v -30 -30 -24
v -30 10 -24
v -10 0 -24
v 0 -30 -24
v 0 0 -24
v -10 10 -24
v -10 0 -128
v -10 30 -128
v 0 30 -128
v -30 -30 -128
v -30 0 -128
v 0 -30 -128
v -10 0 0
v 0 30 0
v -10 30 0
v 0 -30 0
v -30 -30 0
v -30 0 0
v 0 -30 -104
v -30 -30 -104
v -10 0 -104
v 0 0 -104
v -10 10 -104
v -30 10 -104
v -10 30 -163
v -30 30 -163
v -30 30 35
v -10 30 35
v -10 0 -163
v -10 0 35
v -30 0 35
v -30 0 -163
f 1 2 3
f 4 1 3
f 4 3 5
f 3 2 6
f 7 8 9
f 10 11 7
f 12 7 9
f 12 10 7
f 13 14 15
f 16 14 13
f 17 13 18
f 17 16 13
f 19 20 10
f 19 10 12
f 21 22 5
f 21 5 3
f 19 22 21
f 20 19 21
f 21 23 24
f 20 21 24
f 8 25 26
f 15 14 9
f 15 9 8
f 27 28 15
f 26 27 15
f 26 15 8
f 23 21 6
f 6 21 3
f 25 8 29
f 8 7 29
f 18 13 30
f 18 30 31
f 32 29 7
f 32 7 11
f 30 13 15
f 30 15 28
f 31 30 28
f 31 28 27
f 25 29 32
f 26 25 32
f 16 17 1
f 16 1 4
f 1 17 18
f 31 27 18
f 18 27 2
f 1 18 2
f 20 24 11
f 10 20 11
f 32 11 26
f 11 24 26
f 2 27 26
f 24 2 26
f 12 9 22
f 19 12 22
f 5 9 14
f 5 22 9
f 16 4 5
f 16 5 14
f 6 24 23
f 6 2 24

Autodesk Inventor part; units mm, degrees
ref_plane "YZ Plane" through (0, 0, 0) normal (1, 0, 0) x (0, 1, 0)
ref_plane "XZ Plane" through (0, 0, 0) normal (0, 1, 0) x (-1, 0, 0)
ref_plane "XY Plane" through (0, 0, 0) normal (0, 0, 1) x (1, 0, 0)
sketch "Sketch1" plane through (0, 0, 0) normal (0, 1, 0) x (-1, 0, 0)
  line L0 (0, 0) -> (10, 0)
  line L1 (10, 0) -> (10, -128)
  line L2 (10, -128) -> (0, -128)
  line L3 (0, -128) -> (0, 0)
  line L4 (10, -128) -> (10, -163)
  line L5 (10, -163) -> (30, -163)
  line L6 (10, 0) -> (10, 35)
  line L7 (10, 35) -> (30, 35)
  line L8 (30, 35) -> (30, -163)
  dimension "d16" = 35
  dimension "d17" = 20
  dimension "d18" = 35
  dimension "d19" = 20
  dimension "d28" = 128
  dimension "d35" = 10
extrude "Extrusion1" add sketch "Sketch1" along normal blind 30
sketch "Sketch2" plane through (0, 0, 0) normal (0, -1, 0) x (1, 0, 0)
  line L0 (-30, -163) -> (-30, 35) projected
  line L1 (-30, -104) -> (-10, -104)
  line L2 (-10, -104) -> (-10, -24)
  line L3 (-10, -24) -> (-30, -24)
  line L4 (-30, -24) -> (-30, -104)
  line L5 (-10, 0) -> (0, 0) projected
  dimension "d22" = 20
  dimension "d23" = 80
  dimension "d25" = 24
extrude "Extrusion6" cut sketch "Sketch2" against normal blind 10
sketch "Sketch6" plane through (0, 0, 0) normal (0, -1, 0) x (1, 0, 0)
  line L0 (-30, -24) -> (-10, -24) projected
  line L1 (-10, 0) -> (0, 0) projected
  line L2 (-30, -24) -> (0, -24)
  line L3 (0, -24) -> (0, 0)
  line L4 (0, 0) -> (-30, 0)
  line L5 (-30, 0) -> (-30, -24)
  line L6 (-10, -104) -> (-30, -104) projected
  line L7 (0, 0) -> (0, -128) projected
  line L8 (-30, -104) -> (0, -104)
  line L9 (0, -104) -> (0, -128)
  line L10 (0, -128) -> (-30, -128)
  line L11 (-30, -128) -> (-30, -104)
extrude "Extrusion7" add sketch "Sketch6" along normal blind 30
properties part number "Tunnel_Holder"
